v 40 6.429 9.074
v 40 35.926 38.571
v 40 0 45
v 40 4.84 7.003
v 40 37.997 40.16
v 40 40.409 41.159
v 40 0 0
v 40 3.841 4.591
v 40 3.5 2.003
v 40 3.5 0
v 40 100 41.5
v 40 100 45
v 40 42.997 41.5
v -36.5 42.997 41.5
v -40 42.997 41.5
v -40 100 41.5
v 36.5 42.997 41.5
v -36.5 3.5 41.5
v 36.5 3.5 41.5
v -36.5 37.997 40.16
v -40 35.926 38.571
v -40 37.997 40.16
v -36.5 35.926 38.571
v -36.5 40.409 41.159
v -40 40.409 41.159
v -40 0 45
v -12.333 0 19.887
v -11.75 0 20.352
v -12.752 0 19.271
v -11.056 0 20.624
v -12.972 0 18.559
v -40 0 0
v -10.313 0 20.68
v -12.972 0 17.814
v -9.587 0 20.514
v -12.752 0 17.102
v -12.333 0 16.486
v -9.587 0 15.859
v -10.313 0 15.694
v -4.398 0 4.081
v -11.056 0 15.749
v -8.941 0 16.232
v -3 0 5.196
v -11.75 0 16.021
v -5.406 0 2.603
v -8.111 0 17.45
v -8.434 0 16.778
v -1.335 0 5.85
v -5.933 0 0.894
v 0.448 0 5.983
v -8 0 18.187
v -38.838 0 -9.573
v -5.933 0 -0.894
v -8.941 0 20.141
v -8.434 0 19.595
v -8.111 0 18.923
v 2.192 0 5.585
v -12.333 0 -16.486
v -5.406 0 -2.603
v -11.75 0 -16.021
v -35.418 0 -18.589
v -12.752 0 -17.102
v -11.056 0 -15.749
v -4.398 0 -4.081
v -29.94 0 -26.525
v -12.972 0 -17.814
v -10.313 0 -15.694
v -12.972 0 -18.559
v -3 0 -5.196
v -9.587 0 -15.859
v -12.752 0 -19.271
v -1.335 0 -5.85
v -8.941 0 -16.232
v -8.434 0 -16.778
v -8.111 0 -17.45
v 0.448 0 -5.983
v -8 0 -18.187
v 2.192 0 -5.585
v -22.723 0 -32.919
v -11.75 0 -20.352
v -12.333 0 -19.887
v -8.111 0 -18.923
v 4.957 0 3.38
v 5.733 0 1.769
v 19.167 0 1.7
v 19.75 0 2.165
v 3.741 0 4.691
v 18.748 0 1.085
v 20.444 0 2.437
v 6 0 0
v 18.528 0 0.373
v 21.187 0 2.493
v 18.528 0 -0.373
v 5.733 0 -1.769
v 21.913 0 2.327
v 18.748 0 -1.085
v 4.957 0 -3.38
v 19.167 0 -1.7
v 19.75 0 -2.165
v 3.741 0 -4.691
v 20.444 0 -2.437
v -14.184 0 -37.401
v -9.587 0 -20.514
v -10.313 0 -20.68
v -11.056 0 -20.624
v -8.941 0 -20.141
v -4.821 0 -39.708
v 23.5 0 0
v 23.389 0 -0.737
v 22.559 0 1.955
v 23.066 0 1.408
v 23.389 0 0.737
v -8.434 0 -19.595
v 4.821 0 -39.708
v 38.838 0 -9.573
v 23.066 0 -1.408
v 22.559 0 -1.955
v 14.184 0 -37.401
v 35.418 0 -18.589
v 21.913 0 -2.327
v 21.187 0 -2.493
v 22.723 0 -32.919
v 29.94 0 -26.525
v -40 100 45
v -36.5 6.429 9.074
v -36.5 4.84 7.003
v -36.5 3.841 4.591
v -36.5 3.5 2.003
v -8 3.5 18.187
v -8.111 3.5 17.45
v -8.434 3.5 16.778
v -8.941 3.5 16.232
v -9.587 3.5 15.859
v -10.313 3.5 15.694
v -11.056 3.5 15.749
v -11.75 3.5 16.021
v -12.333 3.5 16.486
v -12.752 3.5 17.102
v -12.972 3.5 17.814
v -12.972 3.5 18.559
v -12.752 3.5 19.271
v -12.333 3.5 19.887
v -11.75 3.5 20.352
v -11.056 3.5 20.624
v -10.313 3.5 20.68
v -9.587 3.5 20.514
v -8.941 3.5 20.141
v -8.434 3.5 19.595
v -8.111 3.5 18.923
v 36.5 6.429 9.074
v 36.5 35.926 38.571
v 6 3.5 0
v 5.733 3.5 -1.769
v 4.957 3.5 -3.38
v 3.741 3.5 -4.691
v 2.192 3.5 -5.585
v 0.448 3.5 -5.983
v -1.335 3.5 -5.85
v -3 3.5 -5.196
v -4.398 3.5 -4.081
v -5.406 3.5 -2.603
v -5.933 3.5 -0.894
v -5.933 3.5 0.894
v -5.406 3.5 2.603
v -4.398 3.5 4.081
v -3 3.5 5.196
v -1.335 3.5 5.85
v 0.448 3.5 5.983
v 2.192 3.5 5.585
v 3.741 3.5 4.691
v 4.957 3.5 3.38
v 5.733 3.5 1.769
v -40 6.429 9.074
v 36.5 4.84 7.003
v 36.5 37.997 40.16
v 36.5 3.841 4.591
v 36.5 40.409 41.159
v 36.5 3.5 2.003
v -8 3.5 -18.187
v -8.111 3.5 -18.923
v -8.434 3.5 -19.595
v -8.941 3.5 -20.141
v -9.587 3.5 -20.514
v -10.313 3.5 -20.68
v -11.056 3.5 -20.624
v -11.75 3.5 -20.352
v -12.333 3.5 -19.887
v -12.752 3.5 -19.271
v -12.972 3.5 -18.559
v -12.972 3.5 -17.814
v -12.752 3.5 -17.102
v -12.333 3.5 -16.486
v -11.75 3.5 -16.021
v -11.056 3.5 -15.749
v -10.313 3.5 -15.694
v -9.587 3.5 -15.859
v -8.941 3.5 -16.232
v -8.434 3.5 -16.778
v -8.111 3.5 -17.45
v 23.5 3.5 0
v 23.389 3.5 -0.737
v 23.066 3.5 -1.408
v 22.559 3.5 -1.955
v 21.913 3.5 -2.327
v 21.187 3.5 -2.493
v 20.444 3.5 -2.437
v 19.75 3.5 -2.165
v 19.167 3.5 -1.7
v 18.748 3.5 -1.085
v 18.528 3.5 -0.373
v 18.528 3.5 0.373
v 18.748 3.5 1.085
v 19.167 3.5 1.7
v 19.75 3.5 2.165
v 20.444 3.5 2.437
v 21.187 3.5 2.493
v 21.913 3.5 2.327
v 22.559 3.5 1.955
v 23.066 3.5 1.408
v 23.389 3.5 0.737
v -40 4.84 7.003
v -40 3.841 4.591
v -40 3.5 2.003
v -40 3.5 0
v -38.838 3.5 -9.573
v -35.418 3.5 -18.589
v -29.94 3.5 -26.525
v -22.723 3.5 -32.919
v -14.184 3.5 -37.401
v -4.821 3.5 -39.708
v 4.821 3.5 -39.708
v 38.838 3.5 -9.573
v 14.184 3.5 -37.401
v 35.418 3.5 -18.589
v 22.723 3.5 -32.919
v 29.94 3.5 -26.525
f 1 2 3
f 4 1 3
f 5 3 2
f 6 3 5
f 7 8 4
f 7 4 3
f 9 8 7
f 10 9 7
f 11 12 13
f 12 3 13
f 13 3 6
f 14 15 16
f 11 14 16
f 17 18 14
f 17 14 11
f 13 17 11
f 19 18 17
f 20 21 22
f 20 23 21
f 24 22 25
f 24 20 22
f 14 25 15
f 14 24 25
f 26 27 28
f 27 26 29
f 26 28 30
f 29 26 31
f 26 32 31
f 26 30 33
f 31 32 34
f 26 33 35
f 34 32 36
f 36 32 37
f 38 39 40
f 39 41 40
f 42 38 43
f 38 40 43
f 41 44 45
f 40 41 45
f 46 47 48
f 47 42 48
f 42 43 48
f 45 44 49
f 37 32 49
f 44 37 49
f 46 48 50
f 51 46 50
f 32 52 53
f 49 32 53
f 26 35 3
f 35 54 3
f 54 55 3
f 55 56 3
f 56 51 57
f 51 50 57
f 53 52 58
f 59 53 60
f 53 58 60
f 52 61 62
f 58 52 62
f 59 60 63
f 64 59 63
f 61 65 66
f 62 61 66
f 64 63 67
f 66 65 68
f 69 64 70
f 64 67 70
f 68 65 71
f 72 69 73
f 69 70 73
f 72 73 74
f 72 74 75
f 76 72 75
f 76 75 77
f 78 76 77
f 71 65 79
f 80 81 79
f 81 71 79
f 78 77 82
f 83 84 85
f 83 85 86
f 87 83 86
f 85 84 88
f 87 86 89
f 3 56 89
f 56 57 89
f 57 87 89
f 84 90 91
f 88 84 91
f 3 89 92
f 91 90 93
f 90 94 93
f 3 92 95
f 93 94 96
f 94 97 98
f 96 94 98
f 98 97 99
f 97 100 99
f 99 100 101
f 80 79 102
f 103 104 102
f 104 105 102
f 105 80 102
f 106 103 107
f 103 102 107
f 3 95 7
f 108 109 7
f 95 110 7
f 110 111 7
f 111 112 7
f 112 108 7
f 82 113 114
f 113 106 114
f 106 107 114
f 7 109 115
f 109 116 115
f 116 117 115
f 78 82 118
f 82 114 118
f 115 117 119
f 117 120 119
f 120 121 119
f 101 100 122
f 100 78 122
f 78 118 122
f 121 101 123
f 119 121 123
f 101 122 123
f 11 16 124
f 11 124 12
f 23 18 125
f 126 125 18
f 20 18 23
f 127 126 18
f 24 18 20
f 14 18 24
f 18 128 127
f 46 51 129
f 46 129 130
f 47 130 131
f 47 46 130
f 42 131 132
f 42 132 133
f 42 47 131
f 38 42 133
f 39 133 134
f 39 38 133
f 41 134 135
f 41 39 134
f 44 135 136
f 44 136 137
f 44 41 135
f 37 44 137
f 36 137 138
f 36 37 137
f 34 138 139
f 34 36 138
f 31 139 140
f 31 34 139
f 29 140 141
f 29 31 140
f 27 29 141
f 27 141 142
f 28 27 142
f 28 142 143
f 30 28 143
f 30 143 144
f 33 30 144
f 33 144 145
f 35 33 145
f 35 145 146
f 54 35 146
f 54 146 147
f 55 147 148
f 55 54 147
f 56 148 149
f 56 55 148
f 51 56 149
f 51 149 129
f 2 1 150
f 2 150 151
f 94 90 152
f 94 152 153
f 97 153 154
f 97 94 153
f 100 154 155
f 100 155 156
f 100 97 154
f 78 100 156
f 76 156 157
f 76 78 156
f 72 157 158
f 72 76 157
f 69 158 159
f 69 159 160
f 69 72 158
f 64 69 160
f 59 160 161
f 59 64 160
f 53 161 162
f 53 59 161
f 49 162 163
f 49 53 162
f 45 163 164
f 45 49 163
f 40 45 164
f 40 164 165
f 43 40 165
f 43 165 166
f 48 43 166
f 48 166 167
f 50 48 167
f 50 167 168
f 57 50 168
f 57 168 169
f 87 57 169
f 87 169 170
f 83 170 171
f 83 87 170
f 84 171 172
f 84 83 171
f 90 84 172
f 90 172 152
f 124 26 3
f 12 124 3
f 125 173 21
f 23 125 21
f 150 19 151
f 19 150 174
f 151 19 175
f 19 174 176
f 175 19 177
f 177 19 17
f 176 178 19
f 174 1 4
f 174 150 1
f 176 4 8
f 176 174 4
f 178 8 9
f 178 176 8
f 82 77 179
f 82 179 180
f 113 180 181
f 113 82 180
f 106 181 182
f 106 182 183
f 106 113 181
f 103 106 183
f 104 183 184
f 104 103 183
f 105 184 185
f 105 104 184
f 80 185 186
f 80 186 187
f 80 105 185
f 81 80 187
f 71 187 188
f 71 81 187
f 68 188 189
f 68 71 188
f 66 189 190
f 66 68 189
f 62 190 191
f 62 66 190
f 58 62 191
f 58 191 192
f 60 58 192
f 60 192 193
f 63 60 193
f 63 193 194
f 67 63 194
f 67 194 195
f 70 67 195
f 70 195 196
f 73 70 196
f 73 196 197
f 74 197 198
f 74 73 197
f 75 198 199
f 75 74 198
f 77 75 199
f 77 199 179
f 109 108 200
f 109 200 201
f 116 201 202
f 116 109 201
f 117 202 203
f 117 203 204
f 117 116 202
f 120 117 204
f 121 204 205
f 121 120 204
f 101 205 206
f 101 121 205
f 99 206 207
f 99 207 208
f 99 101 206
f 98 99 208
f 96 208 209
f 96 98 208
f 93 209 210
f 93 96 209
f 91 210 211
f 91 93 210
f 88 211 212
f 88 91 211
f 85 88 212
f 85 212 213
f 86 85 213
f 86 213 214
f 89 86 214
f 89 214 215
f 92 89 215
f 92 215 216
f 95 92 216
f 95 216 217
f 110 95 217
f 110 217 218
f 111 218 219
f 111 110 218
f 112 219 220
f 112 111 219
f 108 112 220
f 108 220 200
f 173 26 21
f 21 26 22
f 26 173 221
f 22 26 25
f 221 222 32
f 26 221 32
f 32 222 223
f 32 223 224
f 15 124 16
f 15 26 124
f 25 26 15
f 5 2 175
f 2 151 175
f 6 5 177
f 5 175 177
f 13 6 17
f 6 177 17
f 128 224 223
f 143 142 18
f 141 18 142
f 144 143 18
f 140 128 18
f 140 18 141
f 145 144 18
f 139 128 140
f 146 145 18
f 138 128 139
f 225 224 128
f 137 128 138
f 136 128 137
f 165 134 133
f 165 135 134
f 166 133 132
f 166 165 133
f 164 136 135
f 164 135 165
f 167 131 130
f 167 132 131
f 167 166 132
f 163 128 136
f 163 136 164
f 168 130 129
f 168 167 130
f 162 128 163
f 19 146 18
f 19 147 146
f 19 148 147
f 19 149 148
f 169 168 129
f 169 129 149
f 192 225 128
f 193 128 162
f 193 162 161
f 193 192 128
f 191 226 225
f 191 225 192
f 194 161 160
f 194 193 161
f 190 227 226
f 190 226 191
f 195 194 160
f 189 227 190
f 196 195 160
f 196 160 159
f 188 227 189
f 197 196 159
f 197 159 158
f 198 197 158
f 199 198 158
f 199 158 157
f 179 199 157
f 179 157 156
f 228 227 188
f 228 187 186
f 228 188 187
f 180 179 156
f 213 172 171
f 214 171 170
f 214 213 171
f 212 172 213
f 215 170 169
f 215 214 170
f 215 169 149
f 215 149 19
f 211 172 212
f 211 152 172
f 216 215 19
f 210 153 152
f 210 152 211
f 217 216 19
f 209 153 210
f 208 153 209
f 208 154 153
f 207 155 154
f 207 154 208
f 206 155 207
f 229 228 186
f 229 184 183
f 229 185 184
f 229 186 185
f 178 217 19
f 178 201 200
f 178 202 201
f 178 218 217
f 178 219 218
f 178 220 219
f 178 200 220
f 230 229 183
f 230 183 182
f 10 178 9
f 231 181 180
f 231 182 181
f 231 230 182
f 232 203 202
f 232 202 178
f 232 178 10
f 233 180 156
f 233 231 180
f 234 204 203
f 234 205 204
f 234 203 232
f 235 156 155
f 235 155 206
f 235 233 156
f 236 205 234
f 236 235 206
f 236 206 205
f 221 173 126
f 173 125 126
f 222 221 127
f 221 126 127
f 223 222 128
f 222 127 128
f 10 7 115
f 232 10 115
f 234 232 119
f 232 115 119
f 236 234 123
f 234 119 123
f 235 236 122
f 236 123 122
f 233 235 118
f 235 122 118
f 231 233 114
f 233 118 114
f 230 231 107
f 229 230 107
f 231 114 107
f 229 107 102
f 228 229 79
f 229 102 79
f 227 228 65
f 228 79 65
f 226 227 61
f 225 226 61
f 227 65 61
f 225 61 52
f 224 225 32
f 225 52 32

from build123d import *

# Parameters (mm, degrees)
SKETCH1_R            = 2.5
SKETCH1_R_2          = 6
BOSS_EXTRUDE1_DEPTH  = 3.5
SKETCH1_3_W          = 80
SKETCH1_3_H          = 3.5
BOSS_EXTRUDE2_DEPTH  = 100
BOSS_EXTRUDE3_DEPTH  = 3.5
FILLET1_R            = 10
FILLET1_OF_MIRROR1_R = 10


with BuildPart() as part:
    # Sketch1 → Boss-Extrude1 (new body)
    with BuildSketch(Plane(origin=(0, 0, 0), x_dir=(1, 0, 0), z_dir=(0, 1, 0))):
        with BuildLine():
            ThreePointArc((40, 0), (0, 40), (-40, 0))
            Line((-40, 0), (-40, -41.5))
            Line((-40, -41.5), (40, -41.5))
            Line((40, -41.5), (40, 0))
        make_face()
        with Locations((21, 0)):
            Circle(SKETCH1_R, mode=Mode.SUBTRACT)
        with Locations((-10.5, -18.186533479)):
            Circle(SKETCH1_R, mode=Mode.SUBTRACT)
        with Locations((-10.5, 18.186533479)):
            Circle(SKETCH1_R, mode=Mode.SUBTRACT)
        Circle(SKETCH1_R_2, mode=Mode.SUBTRACT)
    extrude(amount=BOSS_EXTRUDE1_DEPTH)

    # Sketch1_3 → Boss-Extrude2 (add)
    with BuildSketch(Plane(origin=(0, 0, 0), x_dir=(1, 0, 0), z_dir=(0, 1, 0))):
        with Locations((0, -43.25)):
            Rectangle(SKETCH1_3_W, SKETCH1_3_H)
    extrude(amount=BOSS_EXTRUDE2_DEPTH)

    # Sketch5 → Boss-Extrude3 (add)
    with BuildSketch(Plane.ZY.offset(40)):
        Polygon((6.144660941, 3.5), (41.5, 38.855339059), (41.5, 3.5), align=None)
    boss_extrude3 = extrude(amount=-BOSS_EXTRUDE3_DEPTH)

    # Fillet1
    fillet1_edges = [part.edges().sort_by_distance(p)[0] for p in [
        (-38.25, 3.5, 6.144660941),
        (-38.25, 38.855339059, 41.5),
    ]]
    fillet(fillet1_edges, radius=FILLET1_R)

    # Mirror1: Boss-Extrude3 across plane
    add(boss_extrude3.mirror(Plane(origin=(0, 0, 0), x_dir=(0, 0, 1), z_dir=(1, 0, 0))))

    # Fillet1 of Mirror1
    fillet1_of_mirror1_edges = [part.edges().sort_by_distance(p)[0] for p in [
        (38.25, 3.5, 6.144660941),
        (38.25, 38.855339059, 41.5),
    ]]
    fillet(fillet1_of_mirror1_edges, radius=FILLET1_OF_MIRROR1_R)


solid = part.part
